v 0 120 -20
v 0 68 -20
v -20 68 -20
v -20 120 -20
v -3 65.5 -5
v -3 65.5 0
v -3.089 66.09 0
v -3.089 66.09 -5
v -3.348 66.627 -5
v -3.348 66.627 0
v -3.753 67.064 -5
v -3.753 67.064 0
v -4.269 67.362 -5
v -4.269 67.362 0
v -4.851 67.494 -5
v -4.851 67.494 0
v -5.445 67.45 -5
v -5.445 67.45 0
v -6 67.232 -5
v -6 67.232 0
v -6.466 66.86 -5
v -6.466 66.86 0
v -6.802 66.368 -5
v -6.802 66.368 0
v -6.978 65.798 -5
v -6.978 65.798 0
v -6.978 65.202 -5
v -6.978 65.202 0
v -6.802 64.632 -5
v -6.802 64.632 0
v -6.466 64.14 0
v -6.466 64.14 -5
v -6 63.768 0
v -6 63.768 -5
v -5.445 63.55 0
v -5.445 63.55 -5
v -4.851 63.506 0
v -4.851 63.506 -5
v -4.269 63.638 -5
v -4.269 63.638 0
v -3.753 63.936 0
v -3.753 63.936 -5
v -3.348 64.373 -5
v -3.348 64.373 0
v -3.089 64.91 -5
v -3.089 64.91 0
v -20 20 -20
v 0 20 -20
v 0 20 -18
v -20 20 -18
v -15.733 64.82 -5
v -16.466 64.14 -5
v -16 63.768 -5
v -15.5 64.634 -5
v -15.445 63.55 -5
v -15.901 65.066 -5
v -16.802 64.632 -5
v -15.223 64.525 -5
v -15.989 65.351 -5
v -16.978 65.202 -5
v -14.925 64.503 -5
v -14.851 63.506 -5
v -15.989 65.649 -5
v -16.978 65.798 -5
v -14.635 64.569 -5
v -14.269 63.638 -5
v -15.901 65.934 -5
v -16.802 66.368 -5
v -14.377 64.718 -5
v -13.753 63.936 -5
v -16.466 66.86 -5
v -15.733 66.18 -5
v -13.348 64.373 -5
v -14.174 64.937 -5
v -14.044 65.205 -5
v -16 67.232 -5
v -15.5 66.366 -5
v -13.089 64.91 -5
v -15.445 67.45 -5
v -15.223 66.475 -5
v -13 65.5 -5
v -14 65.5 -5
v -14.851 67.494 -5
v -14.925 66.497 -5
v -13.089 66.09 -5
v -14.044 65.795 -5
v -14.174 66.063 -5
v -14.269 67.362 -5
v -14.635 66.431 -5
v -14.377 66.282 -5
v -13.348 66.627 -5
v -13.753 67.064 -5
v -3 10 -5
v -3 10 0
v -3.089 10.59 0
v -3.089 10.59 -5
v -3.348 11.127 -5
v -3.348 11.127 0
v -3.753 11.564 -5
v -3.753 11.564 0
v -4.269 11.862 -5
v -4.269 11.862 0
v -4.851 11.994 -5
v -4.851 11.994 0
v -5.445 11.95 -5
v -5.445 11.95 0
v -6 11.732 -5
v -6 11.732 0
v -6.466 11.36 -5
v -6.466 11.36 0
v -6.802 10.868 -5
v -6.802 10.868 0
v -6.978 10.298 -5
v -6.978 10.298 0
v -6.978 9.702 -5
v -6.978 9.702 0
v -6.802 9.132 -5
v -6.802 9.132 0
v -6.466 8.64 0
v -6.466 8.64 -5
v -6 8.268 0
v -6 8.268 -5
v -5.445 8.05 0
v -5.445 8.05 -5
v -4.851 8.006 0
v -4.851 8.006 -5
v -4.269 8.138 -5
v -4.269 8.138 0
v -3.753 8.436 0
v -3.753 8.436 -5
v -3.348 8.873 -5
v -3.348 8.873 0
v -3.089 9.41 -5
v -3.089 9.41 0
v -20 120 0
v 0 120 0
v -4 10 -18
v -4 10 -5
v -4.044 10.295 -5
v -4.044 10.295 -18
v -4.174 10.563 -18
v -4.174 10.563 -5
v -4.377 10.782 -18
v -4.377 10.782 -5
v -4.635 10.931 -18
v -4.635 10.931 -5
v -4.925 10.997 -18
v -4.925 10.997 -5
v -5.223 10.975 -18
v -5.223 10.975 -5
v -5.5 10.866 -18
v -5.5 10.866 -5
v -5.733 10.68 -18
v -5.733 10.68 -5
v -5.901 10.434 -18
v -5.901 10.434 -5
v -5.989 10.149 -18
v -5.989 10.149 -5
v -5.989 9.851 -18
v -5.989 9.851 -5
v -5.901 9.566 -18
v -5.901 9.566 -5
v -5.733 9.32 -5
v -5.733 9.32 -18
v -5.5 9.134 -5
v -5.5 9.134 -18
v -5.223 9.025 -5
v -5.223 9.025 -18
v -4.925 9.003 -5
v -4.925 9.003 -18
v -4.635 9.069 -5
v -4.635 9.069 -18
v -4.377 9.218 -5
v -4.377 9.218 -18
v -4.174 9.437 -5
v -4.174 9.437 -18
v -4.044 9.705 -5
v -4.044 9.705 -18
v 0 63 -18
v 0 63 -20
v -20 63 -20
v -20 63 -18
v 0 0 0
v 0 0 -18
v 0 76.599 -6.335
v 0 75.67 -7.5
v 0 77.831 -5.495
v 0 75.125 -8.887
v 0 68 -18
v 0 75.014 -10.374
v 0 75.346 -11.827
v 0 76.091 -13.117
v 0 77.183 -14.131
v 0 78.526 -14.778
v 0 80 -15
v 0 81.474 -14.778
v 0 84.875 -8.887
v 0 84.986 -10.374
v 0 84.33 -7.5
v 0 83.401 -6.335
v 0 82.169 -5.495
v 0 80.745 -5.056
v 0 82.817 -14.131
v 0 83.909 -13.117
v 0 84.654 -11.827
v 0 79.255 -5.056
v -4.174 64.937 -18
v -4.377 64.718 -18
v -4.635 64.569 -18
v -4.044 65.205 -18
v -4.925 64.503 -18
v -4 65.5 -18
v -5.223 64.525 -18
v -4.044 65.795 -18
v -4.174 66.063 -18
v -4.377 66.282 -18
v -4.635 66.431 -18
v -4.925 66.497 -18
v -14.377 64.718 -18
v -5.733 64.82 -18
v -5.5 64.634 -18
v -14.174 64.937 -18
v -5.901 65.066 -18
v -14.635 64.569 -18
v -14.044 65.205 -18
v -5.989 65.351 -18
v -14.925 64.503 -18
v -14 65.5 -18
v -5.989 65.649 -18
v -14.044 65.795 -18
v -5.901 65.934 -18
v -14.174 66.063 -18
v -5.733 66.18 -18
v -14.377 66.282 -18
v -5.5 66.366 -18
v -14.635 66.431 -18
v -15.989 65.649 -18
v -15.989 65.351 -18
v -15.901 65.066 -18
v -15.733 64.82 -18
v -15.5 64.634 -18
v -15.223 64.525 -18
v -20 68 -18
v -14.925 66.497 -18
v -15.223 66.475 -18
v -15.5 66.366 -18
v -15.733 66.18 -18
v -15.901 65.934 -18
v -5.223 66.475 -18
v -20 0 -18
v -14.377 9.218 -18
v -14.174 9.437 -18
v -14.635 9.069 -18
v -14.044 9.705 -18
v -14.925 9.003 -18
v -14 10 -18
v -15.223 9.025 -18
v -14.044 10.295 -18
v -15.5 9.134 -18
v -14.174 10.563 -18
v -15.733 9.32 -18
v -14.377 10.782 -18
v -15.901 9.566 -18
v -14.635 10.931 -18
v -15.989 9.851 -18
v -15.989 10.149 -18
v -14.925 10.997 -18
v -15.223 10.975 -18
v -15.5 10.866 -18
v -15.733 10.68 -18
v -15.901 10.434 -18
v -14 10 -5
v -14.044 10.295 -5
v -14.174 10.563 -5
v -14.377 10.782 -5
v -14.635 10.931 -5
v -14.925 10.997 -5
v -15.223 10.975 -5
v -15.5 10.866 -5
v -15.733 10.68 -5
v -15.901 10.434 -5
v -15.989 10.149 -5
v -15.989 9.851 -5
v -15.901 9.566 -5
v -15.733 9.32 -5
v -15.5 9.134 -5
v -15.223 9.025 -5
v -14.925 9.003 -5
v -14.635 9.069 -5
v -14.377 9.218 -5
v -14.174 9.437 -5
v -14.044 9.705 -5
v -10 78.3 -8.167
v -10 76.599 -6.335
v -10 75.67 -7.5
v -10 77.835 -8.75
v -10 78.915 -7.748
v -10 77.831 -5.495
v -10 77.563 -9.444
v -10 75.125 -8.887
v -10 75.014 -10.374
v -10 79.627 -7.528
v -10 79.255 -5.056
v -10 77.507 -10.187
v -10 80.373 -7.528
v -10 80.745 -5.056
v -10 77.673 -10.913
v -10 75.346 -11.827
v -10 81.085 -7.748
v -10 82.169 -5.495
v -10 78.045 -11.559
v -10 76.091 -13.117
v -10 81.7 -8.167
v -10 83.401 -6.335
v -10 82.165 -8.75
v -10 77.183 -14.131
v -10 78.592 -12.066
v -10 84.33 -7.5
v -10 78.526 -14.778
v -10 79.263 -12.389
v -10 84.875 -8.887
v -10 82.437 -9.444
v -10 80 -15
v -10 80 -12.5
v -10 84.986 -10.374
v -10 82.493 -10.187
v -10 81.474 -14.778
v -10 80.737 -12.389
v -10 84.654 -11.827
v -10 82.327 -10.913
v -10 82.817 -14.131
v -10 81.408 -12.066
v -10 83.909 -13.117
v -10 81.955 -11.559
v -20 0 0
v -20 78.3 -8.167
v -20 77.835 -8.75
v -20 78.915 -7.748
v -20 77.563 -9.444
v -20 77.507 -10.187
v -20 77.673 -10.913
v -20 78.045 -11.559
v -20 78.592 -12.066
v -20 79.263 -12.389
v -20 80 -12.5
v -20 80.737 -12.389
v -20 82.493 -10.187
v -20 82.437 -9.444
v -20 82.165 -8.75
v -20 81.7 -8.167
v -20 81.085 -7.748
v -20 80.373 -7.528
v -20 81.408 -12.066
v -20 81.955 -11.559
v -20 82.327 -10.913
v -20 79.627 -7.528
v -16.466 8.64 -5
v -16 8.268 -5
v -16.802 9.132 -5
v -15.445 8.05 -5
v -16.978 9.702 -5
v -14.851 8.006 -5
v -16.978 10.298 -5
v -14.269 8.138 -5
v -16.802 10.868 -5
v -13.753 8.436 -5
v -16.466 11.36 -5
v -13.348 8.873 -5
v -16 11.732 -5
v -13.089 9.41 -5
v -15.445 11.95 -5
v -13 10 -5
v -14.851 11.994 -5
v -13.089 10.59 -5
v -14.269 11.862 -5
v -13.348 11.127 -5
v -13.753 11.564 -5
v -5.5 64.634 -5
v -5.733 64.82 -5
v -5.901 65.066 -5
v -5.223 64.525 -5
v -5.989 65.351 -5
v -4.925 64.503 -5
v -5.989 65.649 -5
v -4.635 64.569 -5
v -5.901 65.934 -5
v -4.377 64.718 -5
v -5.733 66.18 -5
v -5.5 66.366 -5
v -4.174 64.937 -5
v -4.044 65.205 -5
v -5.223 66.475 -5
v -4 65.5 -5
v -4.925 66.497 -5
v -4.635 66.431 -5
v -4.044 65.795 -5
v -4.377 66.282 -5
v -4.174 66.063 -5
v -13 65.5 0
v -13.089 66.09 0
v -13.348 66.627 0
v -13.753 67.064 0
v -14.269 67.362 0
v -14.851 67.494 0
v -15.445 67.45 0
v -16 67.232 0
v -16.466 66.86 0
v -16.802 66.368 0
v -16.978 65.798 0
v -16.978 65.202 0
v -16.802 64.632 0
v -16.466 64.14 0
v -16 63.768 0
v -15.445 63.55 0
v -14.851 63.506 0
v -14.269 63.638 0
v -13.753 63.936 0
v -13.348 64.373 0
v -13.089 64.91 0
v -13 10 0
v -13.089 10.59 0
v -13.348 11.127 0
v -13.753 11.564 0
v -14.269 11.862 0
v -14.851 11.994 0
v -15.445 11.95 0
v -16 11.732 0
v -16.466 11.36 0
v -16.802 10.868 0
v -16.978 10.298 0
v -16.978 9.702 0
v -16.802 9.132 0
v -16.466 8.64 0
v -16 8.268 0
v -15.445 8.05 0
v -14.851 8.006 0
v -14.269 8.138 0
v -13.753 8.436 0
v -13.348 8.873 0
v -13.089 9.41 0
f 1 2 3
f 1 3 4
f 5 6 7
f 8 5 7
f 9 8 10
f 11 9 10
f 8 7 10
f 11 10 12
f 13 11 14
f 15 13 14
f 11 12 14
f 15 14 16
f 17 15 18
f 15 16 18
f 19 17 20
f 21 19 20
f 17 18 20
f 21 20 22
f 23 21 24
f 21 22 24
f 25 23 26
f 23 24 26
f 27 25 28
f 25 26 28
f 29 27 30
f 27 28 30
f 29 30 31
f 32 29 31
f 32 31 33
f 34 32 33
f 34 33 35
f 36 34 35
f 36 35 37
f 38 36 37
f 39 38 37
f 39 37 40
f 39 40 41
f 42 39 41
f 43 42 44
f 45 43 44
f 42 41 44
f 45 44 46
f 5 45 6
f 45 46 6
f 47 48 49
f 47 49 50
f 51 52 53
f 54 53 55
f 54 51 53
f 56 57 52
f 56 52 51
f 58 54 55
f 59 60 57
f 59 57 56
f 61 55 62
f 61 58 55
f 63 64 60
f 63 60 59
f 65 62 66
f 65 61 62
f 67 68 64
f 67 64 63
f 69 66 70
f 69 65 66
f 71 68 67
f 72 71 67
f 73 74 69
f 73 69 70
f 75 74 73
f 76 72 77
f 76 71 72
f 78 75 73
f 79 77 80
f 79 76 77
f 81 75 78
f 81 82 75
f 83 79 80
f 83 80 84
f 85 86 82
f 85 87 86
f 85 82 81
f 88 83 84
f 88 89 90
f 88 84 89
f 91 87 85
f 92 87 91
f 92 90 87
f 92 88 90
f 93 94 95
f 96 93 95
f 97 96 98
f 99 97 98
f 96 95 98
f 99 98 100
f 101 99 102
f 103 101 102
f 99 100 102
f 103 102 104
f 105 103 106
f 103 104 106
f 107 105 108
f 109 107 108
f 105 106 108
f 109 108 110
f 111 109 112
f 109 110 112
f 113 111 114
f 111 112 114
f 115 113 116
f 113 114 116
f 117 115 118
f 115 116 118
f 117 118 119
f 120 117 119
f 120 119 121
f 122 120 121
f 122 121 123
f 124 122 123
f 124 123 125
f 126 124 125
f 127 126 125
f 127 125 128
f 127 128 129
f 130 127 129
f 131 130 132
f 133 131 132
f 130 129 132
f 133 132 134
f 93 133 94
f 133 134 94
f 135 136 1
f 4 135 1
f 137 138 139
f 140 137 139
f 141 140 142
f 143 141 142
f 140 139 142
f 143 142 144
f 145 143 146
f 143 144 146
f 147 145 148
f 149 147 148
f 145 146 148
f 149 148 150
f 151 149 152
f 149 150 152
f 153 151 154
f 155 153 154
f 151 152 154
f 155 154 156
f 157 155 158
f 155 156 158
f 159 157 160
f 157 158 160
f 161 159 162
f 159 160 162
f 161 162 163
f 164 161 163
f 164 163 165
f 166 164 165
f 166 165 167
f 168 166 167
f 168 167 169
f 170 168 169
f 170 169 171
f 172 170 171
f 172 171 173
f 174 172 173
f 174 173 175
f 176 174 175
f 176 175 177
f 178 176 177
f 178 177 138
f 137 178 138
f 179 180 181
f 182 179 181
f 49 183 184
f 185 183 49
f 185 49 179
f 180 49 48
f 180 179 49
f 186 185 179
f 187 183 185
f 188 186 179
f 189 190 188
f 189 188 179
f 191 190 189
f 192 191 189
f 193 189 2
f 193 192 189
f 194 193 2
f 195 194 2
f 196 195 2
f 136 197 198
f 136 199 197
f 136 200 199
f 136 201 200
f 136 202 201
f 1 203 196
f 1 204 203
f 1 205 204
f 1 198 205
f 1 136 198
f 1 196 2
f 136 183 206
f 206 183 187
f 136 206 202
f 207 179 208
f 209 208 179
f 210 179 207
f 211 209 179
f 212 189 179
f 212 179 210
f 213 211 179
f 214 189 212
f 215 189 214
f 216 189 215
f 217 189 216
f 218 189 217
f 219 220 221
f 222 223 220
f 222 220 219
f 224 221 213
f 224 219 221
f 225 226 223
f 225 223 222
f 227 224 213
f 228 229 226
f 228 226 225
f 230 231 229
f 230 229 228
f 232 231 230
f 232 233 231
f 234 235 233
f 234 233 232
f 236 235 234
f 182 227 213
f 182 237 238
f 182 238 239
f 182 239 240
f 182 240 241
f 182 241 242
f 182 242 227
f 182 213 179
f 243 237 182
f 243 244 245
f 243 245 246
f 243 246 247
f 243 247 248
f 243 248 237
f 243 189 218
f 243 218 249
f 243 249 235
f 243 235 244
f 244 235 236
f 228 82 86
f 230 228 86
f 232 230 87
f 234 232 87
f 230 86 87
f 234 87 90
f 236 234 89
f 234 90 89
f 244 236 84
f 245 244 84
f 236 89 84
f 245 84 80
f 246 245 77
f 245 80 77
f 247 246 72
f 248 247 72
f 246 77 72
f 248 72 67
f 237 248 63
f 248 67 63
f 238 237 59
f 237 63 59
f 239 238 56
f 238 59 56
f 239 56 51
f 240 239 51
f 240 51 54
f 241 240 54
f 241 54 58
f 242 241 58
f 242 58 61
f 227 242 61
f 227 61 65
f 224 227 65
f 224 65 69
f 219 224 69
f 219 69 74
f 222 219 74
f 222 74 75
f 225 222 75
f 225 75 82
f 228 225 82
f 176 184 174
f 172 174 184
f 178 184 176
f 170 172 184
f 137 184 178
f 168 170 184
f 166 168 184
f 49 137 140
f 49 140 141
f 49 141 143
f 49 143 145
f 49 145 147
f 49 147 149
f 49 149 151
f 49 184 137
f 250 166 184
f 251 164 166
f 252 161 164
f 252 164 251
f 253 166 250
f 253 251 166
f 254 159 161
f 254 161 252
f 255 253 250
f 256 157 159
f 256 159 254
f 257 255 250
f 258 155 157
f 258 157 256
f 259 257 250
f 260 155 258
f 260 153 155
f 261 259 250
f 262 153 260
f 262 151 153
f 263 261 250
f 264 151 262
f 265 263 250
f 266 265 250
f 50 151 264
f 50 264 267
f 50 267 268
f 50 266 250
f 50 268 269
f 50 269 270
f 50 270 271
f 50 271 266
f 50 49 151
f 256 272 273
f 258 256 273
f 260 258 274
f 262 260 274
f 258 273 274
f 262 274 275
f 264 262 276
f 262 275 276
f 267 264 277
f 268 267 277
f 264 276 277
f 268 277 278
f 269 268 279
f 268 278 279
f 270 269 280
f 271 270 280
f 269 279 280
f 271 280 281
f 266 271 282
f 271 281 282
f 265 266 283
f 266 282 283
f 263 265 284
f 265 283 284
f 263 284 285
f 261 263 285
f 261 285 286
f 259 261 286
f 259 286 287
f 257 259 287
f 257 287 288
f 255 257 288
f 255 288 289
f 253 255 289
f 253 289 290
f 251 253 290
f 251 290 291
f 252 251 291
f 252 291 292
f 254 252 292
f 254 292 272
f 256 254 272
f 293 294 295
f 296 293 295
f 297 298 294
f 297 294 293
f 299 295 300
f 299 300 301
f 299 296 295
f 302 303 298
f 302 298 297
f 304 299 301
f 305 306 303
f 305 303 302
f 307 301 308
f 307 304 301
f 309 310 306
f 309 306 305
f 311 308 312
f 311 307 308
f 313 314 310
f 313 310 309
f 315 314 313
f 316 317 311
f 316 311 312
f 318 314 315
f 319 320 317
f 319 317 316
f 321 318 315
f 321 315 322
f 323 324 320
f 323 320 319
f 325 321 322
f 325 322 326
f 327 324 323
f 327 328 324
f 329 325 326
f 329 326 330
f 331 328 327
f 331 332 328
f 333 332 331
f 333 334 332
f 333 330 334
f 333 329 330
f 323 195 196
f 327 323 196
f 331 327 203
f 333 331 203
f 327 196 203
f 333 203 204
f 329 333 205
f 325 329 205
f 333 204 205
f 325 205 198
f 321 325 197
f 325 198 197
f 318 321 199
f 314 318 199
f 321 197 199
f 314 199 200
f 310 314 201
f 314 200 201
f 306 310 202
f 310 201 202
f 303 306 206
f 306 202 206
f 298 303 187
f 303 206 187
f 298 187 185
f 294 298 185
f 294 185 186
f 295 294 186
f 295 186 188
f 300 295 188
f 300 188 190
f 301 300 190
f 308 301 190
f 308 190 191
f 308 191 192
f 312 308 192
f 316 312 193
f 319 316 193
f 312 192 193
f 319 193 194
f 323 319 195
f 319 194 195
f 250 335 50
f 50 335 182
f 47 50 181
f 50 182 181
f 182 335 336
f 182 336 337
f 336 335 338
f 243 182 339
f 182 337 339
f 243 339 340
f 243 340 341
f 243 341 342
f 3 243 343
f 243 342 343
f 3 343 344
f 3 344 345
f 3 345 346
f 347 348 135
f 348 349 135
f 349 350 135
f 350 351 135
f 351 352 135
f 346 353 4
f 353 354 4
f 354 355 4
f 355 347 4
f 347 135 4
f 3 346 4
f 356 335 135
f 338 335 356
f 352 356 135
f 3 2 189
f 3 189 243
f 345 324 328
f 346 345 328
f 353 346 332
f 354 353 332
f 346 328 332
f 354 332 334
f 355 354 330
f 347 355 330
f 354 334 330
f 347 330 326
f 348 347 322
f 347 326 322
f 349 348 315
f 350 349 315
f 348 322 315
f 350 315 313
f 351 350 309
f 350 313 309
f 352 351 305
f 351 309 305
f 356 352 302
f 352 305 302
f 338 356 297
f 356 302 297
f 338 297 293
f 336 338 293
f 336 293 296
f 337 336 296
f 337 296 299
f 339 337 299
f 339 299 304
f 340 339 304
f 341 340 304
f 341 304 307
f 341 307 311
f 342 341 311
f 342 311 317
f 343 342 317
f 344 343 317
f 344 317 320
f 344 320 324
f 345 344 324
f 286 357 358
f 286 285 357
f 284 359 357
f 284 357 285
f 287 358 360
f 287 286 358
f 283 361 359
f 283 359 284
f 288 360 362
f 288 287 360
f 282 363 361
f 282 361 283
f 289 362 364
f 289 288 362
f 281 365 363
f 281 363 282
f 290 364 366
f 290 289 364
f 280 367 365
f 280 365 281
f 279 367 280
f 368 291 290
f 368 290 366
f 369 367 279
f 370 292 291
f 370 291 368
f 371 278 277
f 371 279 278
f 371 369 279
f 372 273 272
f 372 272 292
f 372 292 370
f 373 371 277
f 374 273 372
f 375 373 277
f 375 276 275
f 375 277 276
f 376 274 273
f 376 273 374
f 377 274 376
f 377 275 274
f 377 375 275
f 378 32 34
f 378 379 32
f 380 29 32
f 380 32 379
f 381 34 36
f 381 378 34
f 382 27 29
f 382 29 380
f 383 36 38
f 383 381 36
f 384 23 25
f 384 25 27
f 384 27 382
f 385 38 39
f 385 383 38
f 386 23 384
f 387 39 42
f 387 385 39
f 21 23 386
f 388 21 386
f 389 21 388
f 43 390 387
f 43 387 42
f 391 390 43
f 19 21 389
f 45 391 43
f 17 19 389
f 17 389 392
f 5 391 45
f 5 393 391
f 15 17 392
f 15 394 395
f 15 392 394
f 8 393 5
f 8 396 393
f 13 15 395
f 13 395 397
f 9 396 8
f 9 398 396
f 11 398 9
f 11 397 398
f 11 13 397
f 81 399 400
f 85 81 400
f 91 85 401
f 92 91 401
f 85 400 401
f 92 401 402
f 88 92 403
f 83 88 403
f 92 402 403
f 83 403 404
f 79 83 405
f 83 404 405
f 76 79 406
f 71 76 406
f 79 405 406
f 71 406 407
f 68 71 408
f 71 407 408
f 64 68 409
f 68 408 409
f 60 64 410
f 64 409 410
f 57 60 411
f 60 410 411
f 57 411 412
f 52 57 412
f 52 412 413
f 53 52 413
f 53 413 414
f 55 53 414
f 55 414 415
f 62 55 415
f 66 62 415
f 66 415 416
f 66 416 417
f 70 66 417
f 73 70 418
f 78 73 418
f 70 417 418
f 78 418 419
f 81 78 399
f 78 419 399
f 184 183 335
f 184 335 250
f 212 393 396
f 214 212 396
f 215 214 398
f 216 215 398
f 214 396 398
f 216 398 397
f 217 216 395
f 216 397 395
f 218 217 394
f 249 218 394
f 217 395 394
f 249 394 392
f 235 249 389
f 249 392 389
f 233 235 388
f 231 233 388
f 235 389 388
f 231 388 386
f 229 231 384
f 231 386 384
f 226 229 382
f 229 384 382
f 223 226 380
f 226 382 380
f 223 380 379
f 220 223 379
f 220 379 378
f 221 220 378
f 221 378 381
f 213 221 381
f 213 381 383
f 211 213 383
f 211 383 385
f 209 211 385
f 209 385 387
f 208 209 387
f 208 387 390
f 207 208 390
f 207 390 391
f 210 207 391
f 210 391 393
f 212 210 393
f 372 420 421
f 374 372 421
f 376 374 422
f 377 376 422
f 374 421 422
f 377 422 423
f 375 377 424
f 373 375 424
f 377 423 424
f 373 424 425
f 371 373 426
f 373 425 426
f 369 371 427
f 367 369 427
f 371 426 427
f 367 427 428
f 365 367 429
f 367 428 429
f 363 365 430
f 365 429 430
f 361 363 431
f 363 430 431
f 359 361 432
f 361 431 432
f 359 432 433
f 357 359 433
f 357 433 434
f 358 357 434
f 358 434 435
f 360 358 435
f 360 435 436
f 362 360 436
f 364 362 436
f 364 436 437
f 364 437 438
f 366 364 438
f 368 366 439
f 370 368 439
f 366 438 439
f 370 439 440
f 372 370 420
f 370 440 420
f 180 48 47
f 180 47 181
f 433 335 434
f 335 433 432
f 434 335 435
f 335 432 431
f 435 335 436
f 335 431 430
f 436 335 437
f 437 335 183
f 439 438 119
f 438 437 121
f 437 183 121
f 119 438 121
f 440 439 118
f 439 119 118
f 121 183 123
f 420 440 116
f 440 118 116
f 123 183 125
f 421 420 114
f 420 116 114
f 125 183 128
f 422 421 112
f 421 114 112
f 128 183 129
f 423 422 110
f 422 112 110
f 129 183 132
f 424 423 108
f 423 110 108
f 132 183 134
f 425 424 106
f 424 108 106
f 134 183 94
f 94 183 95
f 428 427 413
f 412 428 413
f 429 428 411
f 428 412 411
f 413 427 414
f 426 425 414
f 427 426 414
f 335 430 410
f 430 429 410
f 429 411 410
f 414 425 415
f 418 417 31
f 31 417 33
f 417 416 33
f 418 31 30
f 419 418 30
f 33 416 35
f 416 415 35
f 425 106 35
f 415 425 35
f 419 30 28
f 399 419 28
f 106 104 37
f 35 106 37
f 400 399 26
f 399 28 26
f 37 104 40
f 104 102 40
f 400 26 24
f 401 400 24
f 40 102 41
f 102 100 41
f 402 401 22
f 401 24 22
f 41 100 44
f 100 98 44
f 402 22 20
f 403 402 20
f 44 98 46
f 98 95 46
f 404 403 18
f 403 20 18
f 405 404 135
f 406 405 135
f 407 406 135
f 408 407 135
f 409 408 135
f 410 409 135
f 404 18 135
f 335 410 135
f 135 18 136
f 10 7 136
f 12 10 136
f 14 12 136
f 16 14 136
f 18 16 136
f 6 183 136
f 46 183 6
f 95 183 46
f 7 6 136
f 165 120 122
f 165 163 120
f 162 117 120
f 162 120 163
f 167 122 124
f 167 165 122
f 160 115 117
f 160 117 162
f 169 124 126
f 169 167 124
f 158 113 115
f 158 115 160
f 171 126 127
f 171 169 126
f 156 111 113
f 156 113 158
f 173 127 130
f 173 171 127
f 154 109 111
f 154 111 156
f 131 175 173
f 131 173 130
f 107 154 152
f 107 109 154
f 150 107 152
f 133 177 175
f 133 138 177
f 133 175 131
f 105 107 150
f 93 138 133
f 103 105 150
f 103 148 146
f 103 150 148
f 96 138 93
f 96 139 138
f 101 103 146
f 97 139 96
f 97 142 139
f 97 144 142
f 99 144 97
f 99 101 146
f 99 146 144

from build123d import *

# Parameters (mm, degrees)
SKETCH1_W           = 20
SKETCH1_H           = 120
SKETCH1_R           = 2.5
BOSS_EXTRUDE2_DEPTH = 20
SKETCH10_R          = 5
CUT_EXTRUDE1_DEPTH  = 10
SKETCH11_R          = 1
CUT_EXTRUDE2_DEPTH  = 21
SKETCH12_R          = 2
CUT_EXTRUDE3_DEPTH  = 5
SKETCH11_3_R        = 1
CUT_EXTRUDE4_DEPTH  = 21
SKETCH14_W          = 20
SKETCH14_H          = 5
SKETCH14_H_2        = 20
CUT_EXTRUDE6_DEPTH  = 2


with BuildPart() as part:
    # Sketch1 → Boss-Extrude2 (new body)
    with BuildSketch(Plane(origin=(0, 0, 0), x_dir=(0, 0, -1), z_dir=(1, 0, 0))):
        with Locations((10, 60)):
            Rectangle(SKETCH1_W, SKETCH1_H)
        with Locations((10, 80)):
            Circle(SKETCH1_R, mode=Mode.SUBTRACT)
    extrude(amount=-BOSS_EXTRUDE2_DEPTH)

    # Sketch10 → Cut-Extrude1 (cut)
    with BuildSketch(Plane(origin=(0, 0, 0), x_dir=(0, 0, -1), z_dir=(1, 0, 0))):
        with Locations((10, 80)):
            Circle(SKETCH10_R)
    extrude(amount=-CUT_EXTRUDE1_DEPTH, mode=Mode.SUBTRACT)

    # Sketch11 → Cut-Extrude2 (cut, through all)
    with BuildSketch(Plane.XY):
        with Locations((-15, 10)):
            Circle(SKETCH11_R)
        with Locations((-5, 10)):
            Circle(SKETCH11_R)
    extrude(amount=-CUT_EXTRUDE2_DEPTH, mode=Mode.SUBTRACT)

    # Sketch12 → Cut-Extrude3 (cut)
    with BuildSketch(Plane.XY):
        with Locations((-15, 10)):
            Circle(SKETCH12_R)
        with Locations((-5, 10)):
            Circle(SKETCH12_R)
        with Locations((-15, 65.5)):
            Circle(SKETCH12_R)
        with Locations((-5, 65.5)):
            Circle(SKETCH12_R)
    extrude(amount=-CUT_EXTRUDE3_DEPTH, mode=Mode.SUBTRACT)

    # Sketch11<3> → Cut-Extrude4 (cut, through all)
    with BuildSketch(Plane.XY):
        with Locations((-15, 65.5)):
            Circle(SKETCH11_3_R)
        with Locations((-5, 65.5)):
            Circle(SKETCH11_3_R)
    extrude(amount=-CUT_EXTRUDE4_DEPTH, mode=Mode.SUBTRACT)

    # Sketch14 → Cut-Extrude6 (cut)
    with BuildSketch(Plane(origin=(0, 0, -20), x_dir=(-1, 0, 0), z_dir=(0, 0, -1))):
        with Locations((10, 65.5)):
            Rectangle(SKETCH14_W, SKETCH14_H)
        with Locations((10, 10)):
            Rectangle(SKETCH14_W, SKETCH14_H_2)
    extrude(amount=-CUT_EXTRUDE6_DEPTH, mode=Mode.SUBTRACT)


solid = part.part
